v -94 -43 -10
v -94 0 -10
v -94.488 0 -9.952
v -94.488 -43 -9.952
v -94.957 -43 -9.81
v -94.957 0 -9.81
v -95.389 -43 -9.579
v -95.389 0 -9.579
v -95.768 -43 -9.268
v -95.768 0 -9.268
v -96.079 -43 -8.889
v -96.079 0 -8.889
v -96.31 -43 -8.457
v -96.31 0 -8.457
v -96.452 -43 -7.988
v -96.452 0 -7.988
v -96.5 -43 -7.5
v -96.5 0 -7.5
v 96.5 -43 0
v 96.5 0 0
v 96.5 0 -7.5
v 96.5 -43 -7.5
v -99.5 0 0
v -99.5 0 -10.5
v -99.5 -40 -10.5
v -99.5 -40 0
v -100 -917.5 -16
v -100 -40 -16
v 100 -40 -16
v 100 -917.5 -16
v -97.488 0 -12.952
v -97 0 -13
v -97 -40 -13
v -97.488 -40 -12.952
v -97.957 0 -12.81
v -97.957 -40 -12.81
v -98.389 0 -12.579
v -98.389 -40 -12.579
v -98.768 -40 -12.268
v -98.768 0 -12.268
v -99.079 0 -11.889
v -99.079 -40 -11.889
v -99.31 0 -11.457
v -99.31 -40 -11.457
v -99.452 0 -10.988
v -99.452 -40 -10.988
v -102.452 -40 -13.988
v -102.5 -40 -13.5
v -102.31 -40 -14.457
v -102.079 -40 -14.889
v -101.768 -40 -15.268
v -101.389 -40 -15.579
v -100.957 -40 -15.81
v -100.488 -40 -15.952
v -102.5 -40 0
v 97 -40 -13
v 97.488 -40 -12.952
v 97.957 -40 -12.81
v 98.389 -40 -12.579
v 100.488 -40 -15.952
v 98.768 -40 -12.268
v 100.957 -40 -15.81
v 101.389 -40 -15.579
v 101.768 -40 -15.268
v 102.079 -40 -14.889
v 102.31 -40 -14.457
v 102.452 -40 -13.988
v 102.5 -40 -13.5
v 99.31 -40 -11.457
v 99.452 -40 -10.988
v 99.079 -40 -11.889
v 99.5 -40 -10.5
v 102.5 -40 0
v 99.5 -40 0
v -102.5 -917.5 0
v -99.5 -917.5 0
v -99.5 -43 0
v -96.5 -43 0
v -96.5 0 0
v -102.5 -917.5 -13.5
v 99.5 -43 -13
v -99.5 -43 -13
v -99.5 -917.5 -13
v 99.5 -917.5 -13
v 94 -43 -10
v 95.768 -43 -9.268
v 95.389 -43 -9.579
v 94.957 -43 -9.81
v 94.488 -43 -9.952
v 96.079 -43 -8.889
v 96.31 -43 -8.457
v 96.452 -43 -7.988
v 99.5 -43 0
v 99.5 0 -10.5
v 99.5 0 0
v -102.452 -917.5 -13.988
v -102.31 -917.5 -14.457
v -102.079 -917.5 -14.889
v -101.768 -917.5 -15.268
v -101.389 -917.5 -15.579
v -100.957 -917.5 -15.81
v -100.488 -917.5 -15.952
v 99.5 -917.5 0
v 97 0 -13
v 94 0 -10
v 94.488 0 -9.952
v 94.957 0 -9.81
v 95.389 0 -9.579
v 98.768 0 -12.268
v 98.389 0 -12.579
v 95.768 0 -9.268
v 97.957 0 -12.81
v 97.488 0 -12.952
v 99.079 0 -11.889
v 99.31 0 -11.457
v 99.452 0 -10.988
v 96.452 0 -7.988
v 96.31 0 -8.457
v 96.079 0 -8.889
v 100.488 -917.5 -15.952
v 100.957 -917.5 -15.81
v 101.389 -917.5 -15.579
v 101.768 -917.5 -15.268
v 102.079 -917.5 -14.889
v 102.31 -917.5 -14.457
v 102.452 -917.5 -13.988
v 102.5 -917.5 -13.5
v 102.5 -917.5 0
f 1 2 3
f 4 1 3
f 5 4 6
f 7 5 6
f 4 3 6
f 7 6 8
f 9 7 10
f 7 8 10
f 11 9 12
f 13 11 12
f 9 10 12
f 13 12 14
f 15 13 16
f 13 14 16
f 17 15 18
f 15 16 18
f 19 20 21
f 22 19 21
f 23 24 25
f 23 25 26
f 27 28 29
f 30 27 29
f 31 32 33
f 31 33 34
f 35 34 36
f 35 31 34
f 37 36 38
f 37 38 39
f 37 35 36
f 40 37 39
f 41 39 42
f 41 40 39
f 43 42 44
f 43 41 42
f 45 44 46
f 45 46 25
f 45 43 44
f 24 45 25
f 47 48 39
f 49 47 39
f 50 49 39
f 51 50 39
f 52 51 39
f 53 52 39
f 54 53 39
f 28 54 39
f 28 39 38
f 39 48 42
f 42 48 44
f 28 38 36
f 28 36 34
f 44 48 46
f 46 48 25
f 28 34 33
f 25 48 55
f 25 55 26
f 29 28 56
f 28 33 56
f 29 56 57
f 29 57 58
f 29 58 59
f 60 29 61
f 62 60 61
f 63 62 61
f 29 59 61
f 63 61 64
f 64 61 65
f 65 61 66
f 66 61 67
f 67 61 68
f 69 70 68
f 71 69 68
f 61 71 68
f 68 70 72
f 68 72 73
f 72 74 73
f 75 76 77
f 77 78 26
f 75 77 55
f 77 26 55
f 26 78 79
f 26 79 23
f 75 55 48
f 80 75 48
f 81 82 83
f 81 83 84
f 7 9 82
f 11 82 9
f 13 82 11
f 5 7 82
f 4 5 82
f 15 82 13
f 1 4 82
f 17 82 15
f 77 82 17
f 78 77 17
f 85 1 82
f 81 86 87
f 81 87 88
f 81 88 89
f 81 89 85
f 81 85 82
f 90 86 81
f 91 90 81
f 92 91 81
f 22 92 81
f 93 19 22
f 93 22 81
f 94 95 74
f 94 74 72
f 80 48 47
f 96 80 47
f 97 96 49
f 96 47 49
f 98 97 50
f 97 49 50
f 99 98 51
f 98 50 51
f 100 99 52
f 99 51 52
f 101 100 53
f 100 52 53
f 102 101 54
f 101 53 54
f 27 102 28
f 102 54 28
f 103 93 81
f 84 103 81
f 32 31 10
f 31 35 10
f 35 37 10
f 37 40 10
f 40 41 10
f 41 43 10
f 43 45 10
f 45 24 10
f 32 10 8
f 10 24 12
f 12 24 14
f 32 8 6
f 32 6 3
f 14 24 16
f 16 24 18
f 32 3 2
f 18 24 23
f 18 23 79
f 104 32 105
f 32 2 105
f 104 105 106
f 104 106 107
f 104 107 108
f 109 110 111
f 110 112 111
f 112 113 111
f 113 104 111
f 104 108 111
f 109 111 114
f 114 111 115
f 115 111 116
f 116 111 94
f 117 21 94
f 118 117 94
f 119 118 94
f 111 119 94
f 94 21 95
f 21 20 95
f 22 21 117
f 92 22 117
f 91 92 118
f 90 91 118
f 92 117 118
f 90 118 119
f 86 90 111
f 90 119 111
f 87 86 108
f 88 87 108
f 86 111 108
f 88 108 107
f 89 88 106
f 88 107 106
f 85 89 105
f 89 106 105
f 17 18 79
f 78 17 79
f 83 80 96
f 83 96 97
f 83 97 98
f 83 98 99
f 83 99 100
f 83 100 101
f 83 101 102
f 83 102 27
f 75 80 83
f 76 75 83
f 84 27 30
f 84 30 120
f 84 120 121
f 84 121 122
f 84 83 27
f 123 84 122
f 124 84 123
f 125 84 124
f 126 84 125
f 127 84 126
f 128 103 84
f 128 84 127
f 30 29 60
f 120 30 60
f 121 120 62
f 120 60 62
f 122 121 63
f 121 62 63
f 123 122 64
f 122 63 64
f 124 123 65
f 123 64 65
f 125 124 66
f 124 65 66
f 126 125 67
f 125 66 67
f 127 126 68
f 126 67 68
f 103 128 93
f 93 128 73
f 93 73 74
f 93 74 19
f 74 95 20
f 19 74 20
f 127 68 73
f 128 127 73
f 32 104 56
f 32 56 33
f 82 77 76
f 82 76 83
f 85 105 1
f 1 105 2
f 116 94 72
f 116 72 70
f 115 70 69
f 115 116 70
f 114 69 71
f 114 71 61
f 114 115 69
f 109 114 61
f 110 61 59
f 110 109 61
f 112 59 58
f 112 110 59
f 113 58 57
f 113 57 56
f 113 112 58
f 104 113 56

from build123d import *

# Parameters (mm, degrees)
F1_DEPTH = 917.5
F2_DEPTH = 40
F3_W     = 199
F3_H     = 770.7896669658
F4_DEPTH = 13
F5_DEPTH = 110


with BuildPart() as f1:
    # F0 (on Front) → F1 (new body)
    with BuildSketch(Plane.XZ):
        with BuildLine():
            ThreePointArc((-102.5, -13.5), (-101.767766953, -15.267766953), (-100, -16))
            Line((-100, -16), (100, -16))
            ThreePointArc((100, -16), (101.767766953, -15.267766953), (102.5, -13.5))
            Line((102.5, -13.5), (102.5, 0))
            Line((102.5, 0), (99.5, 0))
            Line((99.5, 0), (99.5, -10.5))
            ThreePointArc((99.5, -10.5), (98.767766953, -12.267766953), (97, -13))
            Line((97, -13), (-97, -13))
            ThreePointArc((-97, -13), (-98.767766953, -12.267766953), (-99.5, -10.5))
            Line((-99.5, -10.5), (-99.5, 0))
            Line((-99.5, 0), (-102.5, 0))
            Line((-102.5, 0), (-102.5, -13.5))
        make_face()
        with BuildLine():
            Line((-96.5, 0), (-99.5, 0))
            Line((-99.5, 0), (-99.5, -10.5))
            ThreePointArc((-99.5, -10.5), (-98.767766953, -12.267766953), (-97, -13))
            Line((-97, -13), (97, -13))
            ThreePointArc((97, -13), (98.767766953, -12.267766953), (99.5, -10.5))
            Line((99.5, -10.5), (99.5, 0))
            Line((99.5, 0), (96.5, 0))
            Line((96.5, 0), (96.5, -7.5))
            ThreePointArc((96.5, -7.5), (95.767766953, -9.267766953), (94, -10))
            Line((94, -10), (-94, -10))
            ThreePointArc((-94, -10), (-95.767766953, -9.267766953), (-96.5, -7.5))
            Line((-96.5, -7.5), (-96.5, 0))
        make_face()
    extrude(amount=F1_DEPTH)

    # F0 (on Front) → F2 (cut)
    with BuildSketch(Plane.XZ):
        with BuildLine():
            ThreePointArc((-102.5, -13.5), (-101.767766953, -15.267766953), (-100, -16))
            Line((-100, -16), (100, -16))
            ThreePointArc((100, -16), (101.767766953, -15.267766953), (102.5, -13.5))
            Line((102.5, -13.5), (102.5, 0))
            Line((102.5, 0), (99.5, 0))
            Line((99.5, 0), (99.5, -10.5))
            ThreePointArc((99.5, -10.5), (98.767766953, -12.267766953), (97, -13))
            Line((97, -13), (-97, -13))
            ThreePointArc((-97, -13), (-98.767766953, -12.267766953), (-99.5, -10.5))
            Line((-99.5, -10.5), (-99.5, 0))
            Line((-99.5, 0), (-102.5, 0))
            Line((-102.5, 0), (-102.5, -13.5))
        make_face()
    extrude(amount=F2_DEPTH, mode=Mode.SUBTRACT)

    # F3 (on face) → F4 (cut)
    with BuildSketch(Plane.XY):
        with Locations((0, -428.3948334829)):
            Rectangle(F3_W, F3_H)
    extrude(amount=-F4_DEPTH, mode=Mode.SUBTRACT)

    # F5 (cut): a face of the model
    f5_faces = [f1.faces().sort_by_distance(p)[0] for p in [
        (0, -813.7896669658, -10.9004362027),
    ]]
    extrude(f5_faces, amount=-F5_DEPTH, mode=Mode.SUBTRACT)


solid = f1.part
